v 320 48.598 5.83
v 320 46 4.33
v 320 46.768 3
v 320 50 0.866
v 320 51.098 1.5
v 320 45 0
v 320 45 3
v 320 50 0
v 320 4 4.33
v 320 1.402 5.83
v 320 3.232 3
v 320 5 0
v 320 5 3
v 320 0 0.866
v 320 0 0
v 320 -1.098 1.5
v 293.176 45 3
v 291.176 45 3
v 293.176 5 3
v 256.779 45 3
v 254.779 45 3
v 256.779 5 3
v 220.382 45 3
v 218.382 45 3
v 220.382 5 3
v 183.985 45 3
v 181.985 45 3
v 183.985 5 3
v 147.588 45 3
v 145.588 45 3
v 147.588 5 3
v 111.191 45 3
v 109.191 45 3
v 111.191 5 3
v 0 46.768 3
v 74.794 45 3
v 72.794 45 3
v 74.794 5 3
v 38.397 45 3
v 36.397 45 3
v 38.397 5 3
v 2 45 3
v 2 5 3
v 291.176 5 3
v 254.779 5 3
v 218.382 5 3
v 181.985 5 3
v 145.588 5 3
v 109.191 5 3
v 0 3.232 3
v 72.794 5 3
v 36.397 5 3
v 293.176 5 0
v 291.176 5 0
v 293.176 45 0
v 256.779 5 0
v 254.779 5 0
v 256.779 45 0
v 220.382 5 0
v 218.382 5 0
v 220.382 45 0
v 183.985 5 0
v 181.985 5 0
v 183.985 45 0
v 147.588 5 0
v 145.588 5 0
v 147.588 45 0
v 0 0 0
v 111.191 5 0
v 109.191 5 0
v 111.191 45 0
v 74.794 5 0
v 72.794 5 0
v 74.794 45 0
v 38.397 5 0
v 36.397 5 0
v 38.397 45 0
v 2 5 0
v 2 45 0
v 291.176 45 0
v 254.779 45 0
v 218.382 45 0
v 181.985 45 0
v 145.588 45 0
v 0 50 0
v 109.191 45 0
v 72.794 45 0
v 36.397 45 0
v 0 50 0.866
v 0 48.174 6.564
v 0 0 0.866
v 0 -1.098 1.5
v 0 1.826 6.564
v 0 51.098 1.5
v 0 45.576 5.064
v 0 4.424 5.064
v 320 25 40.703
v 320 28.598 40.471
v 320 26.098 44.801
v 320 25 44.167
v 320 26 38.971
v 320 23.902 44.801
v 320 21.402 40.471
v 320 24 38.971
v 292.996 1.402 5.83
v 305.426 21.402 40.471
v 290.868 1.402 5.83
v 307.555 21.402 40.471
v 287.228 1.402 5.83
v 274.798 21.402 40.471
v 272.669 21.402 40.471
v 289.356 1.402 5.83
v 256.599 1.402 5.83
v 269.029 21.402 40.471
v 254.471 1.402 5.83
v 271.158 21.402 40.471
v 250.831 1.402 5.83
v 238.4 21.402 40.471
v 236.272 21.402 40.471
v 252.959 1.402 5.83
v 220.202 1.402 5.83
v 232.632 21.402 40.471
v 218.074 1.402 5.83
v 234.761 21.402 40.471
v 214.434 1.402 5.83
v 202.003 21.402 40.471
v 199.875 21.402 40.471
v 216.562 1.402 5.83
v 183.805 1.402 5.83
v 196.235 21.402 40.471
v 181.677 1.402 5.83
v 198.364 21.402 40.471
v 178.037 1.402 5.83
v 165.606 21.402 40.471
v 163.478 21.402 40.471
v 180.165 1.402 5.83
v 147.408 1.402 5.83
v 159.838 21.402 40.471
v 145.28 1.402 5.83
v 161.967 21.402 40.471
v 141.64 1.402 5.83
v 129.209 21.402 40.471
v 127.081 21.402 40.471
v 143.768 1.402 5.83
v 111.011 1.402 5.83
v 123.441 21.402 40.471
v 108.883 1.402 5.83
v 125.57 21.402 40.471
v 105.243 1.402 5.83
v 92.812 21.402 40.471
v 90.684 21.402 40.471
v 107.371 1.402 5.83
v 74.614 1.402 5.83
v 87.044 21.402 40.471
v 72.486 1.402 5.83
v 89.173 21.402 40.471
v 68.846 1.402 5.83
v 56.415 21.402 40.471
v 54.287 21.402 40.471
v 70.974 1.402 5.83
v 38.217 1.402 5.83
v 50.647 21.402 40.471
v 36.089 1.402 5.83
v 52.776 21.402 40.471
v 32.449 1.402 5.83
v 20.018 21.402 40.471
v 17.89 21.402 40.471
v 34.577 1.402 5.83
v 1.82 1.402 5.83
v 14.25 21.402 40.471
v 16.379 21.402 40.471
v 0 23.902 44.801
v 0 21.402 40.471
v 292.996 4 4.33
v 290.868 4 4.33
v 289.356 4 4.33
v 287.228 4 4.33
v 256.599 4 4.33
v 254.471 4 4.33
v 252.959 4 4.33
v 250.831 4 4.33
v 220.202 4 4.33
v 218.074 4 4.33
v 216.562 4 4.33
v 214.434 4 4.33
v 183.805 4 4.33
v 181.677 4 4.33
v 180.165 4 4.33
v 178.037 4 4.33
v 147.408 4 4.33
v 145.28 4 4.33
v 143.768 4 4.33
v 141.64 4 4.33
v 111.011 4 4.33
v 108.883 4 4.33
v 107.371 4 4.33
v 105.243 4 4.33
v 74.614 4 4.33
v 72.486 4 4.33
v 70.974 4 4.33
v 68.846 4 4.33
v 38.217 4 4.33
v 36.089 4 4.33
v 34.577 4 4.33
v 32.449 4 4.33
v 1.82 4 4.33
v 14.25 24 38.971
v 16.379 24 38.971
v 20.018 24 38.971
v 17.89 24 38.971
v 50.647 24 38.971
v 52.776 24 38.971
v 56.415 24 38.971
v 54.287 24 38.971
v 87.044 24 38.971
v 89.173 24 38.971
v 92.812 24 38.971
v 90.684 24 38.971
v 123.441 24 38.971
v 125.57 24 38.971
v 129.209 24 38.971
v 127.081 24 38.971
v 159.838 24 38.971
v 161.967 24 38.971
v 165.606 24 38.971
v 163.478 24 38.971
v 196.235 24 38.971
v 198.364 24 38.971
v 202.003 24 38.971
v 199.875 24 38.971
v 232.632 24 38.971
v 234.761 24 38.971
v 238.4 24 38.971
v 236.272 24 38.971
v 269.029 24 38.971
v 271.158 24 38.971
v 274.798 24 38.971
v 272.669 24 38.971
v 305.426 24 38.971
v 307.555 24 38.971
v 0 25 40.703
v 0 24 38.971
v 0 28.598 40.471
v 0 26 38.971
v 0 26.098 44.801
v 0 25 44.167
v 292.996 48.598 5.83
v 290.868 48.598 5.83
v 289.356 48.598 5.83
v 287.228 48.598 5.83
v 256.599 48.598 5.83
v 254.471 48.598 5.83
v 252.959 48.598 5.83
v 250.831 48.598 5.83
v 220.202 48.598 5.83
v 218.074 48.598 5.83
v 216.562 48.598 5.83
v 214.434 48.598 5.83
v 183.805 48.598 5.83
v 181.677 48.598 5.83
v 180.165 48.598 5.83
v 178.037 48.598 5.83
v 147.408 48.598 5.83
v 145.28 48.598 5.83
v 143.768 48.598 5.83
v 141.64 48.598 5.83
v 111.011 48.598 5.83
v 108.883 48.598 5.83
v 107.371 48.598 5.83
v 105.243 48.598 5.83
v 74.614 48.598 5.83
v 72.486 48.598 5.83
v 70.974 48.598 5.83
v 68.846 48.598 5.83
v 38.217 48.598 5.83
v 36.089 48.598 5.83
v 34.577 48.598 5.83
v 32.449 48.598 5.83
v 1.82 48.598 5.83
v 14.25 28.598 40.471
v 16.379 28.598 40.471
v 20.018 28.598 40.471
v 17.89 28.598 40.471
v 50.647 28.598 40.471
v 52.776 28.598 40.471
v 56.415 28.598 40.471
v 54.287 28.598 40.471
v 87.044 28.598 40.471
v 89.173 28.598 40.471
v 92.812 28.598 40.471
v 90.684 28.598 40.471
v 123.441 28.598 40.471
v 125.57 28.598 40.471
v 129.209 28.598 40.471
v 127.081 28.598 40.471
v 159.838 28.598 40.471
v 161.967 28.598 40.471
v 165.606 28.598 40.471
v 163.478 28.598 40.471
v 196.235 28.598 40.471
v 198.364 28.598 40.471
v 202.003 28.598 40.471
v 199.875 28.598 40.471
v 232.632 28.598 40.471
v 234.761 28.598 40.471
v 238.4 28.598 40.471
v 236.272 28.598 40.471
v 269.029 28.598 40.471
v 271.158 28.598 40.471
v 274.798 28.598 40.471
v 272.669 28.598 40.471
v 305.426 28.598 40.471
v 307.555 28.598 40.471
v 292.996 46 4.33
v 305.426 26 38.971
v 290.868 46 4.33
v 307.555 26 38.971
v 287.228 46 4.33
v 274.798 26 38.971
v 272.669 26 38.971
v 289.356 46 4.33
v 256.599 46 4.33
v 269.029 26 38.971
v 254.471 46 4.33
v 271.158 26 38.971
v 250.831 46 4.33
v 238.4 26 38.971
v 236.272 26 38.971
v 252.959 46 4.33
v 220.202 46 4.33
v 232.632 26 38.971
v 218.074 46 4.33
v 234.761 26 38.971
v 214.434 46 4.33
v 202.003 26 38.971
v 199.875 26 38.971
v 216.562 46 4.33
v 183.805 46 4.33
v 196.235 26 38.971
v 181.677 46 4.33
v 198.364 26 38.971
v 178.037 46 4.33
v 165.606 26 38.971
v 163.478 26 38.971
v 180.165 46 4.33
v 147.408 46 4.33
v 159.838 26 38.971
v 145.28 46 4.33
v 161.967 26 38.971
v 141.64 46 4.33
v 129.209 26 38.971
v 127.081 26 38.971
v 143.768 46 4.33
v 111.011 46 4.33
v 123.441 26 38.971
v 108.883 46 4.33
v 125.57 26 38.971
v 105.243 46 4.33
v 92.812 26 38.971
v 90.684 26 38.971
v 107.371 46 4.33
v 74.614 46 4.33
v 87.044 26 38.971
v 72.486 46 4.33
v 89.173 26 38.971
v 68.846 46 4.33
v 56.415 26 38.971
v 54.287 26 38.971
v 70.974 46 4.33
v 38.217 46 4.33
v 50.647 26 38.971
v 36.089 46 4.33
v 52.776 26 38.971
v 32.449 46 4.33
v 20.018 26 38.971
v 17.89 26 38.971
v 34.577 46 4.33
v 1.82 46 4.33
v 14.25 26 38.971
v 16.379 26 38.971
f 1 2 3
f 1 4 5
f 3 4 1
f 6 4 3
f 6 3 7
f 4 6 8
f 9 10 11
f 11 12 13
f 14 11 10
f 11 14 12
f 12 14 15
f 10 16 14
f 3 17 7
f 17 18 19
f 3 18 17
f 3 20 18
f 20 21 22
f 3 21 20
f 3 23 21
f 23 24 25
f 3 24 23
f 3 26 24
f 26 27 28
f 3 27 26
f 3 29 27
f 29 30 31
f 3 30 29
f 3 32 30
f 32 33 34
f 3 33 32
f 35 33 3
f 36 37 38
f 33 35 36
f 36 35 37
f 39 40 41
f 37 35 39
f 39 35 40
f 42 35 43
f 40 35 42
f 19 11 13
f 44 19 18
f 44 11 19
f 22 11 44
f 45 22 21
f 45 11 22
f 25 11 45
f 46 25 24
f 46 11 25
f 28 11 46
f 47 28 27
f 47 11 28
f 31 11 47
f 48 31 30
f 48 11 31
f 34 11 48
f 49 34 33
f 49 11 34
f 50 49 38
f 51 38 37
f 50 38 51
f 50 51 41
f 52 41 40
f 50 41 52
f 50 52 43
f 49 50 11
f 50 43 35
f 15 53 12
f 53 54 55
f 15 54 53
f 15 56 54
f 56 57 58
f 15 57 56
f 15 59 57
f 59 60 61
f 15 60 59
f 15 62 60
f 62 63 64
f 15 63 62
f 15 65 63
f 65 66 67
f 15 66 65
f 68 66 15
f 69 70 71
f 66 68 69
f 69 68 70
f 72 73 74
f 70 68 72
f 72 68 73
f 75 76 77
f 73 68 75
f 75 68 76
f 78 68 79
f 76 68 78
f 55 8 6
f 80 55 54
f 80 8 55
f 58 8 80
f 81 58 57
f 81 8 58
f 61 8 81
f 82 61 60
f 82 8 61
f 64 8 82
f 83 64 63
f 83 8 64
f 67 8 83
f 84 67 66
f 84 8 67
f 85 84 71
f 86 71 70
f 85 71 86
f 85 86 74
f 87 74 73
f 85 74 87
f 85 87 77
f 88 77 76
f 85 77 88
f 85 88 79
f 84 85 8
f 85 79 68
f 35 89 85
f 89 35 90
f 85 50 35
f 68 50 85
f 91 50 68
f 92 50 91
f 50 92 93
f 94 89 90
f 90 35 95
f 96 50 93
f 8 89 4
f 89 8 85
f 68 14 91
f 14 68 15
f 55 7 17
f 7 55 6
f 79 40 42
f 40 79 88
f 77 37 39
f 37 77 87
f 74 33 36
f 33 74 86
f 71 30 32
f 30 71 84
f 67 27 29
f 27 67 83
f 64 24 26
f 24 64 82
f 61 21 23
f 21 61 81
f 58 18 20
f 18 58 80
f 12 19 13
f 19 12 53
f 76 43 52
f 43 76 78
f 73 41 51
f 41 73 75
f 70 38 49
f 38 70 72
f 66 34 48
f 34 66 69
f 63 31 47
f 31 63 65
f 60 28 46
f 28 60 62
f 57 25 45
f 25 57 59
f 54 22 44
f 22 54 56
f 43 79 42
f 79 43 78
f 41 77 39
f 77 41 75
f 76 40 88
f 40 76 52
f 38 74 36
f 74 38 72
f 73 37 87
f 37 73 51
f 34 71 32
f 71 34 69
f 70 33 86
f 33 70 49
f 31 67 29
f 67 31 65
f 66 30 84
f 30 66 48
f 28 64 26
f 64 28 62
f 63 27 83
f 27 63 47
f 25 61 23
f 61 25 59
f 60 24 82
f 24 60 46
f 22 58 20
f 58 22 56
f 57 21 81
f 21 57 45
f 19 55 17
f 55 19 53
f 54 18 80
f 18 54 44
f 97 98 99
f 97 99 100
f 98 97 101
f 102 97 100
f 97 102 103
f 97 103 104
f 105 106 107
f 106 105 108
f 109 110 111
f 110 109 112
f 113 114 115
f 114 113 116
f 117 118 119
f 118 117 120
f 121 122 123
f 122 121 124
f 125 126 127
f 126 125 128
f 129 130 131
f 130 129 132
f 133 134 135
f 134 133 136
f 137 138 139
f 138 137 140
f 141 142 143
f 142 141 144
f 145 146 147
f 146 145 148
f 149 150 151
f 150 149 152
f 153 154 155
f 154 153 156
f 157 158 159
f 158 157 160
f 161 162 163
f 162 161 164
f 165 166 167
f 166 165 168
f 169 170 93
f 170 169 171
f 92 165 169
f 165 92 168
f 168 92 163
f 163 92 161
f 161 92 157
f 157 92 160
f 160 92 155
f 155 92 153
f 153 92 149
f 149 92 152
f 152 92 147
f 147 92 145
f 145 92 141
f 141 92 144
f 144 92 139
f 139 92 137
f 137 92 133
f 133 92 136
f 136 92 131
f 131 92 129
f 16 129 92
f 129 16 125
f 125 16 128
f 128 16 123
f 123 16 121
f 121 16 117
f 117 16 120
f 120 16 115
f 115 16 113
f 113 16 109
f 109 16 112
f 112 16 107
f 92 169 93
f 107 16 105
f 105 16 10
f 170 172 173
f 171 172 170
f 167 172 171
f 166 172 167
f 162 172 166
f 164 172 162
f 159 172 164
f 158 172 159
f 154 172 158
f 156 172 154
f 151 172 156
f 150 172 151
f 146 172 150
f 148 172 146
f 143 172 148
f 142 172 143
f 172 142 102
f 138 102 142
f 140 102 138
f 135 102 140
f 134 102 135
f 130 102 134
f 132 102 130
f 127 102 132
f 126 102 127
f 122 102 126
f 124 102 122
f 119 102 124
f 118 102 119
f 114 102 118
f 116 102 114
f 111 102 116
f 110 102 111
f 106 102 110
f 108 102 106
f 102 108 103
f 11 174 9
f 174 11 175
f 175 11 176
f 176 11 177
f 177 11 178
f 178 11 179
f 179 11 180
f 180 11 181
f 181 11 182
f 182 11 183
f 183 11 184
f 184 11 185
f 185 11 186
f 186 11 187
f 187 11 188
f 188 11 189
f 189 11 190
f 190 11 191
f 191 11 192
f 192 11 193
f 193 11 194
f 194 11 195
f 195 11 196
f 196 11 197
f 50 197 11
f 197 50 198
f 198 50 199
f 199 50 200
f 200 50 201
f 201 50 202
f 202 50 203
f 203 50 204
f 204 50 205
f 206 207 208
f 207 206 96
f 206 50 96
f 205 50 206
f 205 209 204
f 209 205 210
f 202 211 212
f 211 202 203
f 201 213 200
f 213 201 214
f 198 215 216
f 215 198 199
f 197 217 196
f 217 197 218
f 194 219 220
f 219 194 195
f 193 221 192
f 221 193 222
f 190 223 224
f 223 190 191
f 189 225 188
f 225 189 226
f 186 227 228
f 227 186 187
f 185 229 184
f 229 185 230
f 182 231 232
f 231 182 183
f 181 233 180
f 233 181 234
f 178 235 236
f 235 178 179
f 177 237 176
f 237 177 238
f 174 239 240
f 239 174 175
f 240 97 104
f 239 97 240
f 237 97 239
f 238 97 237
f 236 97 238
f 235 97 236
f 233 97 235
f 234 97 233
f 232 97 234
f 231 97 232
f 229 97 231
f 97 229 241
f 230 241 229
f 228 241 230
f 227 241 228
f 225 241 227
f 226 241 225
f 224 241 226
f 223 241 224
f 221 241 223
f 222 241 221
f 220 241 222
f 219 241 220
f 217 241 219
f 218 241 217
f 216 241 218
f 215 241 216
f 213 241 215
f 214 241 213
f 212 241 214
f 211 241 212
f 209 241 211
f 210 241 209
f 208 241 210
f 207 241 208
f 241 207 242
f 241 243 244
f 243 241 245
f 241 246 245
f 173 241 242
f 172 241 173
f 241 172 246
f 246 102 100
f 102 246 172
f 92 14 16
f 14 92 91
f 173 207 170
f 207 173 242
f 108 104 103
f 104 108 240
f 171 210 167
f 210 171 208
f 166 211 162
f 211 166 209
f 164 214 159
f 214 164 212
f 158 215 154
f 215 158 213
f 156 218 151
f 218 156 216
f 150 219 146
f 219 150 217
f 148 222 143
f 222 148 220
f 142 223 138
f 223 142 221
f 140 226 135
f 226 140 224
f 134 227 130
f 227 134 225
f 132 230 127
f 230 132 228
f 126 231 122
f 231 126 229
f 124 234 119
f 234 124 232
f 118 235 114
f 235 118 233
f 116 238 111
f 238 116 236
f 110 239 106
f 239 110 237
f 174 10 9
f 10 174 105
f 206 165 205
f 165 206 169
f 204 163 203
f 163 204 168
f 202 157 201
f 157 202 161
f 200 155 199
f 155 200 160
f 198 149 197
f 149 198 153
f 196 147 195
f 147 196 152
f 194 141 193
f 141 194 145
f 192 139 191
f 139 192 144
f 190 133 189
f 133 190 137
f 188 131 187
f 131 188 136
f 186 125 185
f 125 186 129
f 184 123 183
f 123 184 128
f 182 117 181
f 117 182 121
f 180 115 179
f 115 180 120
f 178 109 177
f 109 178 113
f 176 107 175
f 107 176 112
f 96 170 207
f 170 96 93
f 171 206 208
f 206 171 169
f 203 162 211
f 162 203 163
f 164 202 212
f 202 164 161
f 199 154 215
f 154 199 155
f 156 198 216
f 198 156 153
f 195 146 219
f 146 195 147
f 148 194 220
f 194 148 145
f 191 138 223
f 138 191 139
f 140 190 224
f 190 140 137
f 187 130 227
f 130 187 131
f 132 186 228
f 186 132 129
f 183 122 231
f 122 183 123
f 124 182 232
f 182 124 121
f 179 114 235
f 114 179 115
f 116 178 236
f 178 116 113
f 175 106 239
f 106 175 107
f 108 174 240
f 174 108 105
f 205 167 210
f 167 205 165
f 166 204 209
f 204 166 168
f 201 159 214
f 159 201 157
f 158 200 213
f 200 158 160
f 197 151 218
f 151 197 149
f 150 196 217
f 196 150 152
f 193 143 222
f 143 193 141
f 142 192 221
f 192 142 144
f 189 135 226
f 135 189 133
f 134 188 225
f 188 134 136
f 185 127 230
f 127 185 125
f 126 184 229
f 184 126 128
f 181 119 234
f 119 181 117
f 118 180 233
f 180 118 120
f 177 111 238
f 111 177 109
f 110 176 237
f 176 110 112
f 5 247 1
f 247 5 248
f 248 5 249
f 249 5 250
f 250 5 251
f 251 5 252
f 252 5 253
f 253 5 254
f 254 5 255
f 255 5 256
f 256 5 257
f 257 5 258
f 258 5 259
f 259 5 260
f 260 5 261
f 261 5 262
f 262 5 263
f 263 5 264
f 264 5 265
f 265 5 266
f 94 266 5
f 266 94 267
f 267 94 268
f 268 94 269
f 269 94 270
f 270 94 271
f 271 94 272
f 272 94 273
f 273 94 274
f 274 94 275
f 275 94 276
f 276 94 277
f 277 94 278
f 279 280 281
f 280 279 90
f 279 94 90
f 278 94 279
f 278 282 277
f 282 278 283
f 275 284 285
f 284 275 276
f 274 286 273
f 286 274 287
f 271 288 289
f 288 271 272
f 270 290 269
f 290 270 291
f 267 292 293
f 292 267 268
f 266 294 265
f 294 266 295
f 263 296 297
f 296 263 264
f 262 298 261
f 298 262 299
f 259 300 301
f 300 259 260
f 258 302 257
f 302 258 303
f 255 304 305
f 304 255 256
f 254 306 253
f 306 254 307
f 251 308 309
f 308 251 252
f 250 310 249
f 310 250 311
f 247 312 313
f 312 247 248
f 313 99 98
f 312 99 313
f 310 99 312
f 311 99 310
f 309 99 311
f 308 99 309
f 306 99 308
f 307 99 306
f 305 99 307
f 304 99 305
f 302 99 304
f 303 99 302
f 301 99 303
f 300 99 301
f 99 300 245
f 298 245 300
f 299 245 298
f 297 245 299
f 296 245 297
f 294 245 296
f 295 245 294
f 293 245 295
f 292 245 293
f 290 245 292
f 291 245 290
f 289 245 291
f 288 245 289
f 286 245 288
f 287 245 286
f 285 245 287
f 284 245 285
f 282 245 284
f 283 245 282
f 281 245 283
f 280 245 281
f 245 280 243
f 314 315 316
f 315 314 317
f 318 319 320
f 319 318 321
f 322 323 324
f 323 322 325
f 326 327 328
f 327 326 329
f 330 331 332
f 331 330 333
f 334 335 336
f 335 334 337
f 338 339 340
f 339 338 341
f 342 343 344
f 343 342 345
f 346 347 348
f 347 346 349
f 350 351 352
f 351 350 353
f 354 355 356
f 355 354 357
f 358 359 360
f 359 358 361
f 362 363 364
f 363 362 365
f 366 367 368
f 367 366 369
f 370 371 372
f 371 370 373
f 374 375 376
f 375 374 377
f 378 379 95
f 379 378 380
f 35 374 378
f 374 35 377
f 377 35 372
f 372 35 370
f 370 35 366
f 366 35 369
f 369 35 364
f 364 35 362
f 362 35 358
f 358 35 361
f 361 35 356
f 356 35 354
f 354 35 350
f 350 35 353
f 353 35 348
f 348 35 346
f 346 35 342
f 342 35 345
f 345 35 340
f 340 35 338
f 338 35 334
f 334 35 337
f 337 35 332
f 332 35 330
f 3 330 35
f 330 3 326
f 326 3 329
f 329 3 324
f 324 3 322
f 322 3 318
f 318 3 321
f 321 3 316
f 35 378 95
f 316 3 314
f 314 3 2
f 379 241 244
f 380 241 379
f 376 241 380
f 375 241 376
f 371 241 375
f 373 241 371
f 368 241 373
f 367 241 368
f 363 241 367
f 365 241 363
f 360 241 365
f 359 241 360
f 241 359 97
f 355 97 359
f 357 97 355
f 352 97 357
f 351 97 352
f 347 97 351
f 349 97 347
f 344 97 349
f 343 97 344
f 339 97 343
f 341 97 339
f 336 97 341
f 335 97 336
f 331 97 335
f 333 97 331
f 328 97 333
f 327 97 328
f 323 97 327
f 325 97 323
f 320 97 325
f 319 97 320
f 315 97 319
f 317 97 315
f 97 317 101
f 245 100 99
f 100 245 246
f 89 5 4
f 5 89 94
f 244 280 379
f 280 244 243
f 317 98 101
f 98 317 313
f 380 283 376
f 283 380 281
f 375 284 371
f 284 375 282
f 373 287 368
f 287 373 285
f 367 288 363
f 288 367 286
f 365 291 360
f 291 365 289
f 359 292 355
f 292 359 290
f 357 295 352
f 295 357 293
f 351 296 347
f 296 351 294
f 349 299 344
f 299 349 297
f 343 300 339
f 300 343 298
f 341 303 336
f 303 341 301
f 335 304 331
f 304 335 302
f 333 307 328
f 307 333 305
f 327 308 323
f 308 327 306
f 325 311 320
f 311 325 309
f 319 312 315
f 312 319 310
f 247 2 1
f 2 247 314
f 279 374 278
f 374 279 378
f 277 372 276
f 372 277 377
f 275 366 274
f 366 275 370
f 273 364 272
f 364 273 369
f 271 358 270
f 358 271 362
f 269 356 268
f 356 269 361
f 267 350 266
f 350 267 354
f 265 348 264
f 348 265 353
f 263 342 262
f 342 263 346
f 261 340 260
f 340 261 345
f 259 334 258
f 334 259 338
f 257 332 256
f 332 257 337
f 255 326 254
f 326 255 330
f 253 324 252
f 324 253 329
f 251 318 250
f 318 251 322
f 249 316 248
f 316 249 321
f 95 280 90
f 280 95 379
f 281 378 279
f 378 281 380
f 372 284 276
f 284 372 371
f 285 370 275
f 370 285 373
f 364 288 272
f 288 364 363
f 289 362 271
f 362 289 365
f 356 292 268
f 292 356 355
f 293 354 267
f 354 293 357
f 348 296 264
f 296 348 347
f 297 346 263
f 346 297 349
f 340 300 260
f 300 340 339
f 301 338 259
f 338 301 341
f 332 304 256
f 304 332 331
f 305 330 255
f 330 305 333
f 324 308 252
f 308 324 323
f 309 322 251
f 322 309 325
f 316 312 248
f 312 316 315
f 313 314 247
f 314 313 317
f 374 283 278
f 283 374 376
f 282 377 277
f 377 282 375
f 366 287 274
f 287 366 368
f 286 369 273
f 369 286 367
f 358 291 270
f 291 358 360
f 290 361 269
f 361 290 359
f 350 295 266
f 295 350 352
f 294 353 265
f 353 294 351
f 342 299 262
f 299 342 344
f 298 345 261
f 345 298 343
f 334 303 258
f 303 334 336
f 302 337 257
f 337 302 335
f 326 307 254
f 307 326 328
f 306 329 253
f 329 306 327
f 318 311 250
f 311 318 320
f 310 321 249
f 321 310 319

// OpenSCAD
// file: TrussBeamTwoDimensions.scad
// parameters
X = 320;
Y = 50;
THICKNESS = 3;
ROD_HEIGHT = 5;
TRUSS_WIDTH = 2;
TRUSS_ANGLE = 70;

module TrussBeamTwoDimensions(x, y, thickness, rod_height,
                              truss_width, truss_angle) {
    truss_length = y / sin(truss_angle);
    interval = 2 * truss_length * cos(truss_angle);
    num_of_truss = floor(x / (interval / 2) );
    difference() {
        cube([x, y, thickness]);
        translate([0, rod_height, 0])
            cube([x, y-2*rod_height, thickness]);
    }
    // truss
    intersection() {
        cube([x, y, thickness]);
        for (i = [0 : round(num_of_truss/2)-1]) {
            translate([i*interval, 0, 0])
                rotate([0, 0, truss_angle])
                    cube([truss_length, truss_width, thickness]);
        }
    }
    intersection() {
        cube([x, y, thickness]);
        for (i = [1 : floor(num_of_truss/2)]) {
            translate([i*interval, 0, 0])
                rotate([0, 0, 180 - truss_angle])
                    cube([truss_length, truss_width, thickness]);
        }
    }
}

// main
TrussBeamTwoDimensions(X, Y, THICKNESS, ROD_HEIGHT, TRUSS_WIDTH, TRUSS_ANGLE);
// main file
use <TrussBeamTwoDimensions.scad>;

// parameters
X = 320;
Y = 50;
THICKNESS = 3;
ROD_HEIGHT = 5;
TRUSS_WIDTH = 2;
TRUSS_ANGLE = 70;

module SpaceFrameTrussBeam(x, y, thickness, rod_height,
                           truss_width, truss_angle)  {
    // bottom plate
    truss_length = y / sin(truss_angle);
    interval = 2 * truss_length * cos(truss_angle);
    num_of_truss = floor(x / (interval / 2) );
    difference() {
        cube([x, y, thickness]);
        translate([0, rod_height, 0])
            cube([x, y-2*rod_height, thickness]);
    }
    for (i = [0 : round(num_of_truss/2)-1]) {
        translate([i*interval, 0, 0])
            cube([truss_width, y, thickness]);
    }

    translate([0, thickness/2, 0])
        rotate([60, 0, 0])
            TrussBeamTwoDimensions(x, y, thickness, rod_height, truss_width, truss_angle);
    translate([0, y-thickness/2, 0])
        mirror([0, 1, 0])
            rotate([60, 0, 0])
                TrussBeamTwoDimensions(x, y, thickness, rod_height, truss_width, truss_angle);
}

// main
SpaceFrameTrussBeam(X, Y, THICKNESS, ROD_HEIGHT, TRUSS_WIDTH, TRUSS_ANGLE);
